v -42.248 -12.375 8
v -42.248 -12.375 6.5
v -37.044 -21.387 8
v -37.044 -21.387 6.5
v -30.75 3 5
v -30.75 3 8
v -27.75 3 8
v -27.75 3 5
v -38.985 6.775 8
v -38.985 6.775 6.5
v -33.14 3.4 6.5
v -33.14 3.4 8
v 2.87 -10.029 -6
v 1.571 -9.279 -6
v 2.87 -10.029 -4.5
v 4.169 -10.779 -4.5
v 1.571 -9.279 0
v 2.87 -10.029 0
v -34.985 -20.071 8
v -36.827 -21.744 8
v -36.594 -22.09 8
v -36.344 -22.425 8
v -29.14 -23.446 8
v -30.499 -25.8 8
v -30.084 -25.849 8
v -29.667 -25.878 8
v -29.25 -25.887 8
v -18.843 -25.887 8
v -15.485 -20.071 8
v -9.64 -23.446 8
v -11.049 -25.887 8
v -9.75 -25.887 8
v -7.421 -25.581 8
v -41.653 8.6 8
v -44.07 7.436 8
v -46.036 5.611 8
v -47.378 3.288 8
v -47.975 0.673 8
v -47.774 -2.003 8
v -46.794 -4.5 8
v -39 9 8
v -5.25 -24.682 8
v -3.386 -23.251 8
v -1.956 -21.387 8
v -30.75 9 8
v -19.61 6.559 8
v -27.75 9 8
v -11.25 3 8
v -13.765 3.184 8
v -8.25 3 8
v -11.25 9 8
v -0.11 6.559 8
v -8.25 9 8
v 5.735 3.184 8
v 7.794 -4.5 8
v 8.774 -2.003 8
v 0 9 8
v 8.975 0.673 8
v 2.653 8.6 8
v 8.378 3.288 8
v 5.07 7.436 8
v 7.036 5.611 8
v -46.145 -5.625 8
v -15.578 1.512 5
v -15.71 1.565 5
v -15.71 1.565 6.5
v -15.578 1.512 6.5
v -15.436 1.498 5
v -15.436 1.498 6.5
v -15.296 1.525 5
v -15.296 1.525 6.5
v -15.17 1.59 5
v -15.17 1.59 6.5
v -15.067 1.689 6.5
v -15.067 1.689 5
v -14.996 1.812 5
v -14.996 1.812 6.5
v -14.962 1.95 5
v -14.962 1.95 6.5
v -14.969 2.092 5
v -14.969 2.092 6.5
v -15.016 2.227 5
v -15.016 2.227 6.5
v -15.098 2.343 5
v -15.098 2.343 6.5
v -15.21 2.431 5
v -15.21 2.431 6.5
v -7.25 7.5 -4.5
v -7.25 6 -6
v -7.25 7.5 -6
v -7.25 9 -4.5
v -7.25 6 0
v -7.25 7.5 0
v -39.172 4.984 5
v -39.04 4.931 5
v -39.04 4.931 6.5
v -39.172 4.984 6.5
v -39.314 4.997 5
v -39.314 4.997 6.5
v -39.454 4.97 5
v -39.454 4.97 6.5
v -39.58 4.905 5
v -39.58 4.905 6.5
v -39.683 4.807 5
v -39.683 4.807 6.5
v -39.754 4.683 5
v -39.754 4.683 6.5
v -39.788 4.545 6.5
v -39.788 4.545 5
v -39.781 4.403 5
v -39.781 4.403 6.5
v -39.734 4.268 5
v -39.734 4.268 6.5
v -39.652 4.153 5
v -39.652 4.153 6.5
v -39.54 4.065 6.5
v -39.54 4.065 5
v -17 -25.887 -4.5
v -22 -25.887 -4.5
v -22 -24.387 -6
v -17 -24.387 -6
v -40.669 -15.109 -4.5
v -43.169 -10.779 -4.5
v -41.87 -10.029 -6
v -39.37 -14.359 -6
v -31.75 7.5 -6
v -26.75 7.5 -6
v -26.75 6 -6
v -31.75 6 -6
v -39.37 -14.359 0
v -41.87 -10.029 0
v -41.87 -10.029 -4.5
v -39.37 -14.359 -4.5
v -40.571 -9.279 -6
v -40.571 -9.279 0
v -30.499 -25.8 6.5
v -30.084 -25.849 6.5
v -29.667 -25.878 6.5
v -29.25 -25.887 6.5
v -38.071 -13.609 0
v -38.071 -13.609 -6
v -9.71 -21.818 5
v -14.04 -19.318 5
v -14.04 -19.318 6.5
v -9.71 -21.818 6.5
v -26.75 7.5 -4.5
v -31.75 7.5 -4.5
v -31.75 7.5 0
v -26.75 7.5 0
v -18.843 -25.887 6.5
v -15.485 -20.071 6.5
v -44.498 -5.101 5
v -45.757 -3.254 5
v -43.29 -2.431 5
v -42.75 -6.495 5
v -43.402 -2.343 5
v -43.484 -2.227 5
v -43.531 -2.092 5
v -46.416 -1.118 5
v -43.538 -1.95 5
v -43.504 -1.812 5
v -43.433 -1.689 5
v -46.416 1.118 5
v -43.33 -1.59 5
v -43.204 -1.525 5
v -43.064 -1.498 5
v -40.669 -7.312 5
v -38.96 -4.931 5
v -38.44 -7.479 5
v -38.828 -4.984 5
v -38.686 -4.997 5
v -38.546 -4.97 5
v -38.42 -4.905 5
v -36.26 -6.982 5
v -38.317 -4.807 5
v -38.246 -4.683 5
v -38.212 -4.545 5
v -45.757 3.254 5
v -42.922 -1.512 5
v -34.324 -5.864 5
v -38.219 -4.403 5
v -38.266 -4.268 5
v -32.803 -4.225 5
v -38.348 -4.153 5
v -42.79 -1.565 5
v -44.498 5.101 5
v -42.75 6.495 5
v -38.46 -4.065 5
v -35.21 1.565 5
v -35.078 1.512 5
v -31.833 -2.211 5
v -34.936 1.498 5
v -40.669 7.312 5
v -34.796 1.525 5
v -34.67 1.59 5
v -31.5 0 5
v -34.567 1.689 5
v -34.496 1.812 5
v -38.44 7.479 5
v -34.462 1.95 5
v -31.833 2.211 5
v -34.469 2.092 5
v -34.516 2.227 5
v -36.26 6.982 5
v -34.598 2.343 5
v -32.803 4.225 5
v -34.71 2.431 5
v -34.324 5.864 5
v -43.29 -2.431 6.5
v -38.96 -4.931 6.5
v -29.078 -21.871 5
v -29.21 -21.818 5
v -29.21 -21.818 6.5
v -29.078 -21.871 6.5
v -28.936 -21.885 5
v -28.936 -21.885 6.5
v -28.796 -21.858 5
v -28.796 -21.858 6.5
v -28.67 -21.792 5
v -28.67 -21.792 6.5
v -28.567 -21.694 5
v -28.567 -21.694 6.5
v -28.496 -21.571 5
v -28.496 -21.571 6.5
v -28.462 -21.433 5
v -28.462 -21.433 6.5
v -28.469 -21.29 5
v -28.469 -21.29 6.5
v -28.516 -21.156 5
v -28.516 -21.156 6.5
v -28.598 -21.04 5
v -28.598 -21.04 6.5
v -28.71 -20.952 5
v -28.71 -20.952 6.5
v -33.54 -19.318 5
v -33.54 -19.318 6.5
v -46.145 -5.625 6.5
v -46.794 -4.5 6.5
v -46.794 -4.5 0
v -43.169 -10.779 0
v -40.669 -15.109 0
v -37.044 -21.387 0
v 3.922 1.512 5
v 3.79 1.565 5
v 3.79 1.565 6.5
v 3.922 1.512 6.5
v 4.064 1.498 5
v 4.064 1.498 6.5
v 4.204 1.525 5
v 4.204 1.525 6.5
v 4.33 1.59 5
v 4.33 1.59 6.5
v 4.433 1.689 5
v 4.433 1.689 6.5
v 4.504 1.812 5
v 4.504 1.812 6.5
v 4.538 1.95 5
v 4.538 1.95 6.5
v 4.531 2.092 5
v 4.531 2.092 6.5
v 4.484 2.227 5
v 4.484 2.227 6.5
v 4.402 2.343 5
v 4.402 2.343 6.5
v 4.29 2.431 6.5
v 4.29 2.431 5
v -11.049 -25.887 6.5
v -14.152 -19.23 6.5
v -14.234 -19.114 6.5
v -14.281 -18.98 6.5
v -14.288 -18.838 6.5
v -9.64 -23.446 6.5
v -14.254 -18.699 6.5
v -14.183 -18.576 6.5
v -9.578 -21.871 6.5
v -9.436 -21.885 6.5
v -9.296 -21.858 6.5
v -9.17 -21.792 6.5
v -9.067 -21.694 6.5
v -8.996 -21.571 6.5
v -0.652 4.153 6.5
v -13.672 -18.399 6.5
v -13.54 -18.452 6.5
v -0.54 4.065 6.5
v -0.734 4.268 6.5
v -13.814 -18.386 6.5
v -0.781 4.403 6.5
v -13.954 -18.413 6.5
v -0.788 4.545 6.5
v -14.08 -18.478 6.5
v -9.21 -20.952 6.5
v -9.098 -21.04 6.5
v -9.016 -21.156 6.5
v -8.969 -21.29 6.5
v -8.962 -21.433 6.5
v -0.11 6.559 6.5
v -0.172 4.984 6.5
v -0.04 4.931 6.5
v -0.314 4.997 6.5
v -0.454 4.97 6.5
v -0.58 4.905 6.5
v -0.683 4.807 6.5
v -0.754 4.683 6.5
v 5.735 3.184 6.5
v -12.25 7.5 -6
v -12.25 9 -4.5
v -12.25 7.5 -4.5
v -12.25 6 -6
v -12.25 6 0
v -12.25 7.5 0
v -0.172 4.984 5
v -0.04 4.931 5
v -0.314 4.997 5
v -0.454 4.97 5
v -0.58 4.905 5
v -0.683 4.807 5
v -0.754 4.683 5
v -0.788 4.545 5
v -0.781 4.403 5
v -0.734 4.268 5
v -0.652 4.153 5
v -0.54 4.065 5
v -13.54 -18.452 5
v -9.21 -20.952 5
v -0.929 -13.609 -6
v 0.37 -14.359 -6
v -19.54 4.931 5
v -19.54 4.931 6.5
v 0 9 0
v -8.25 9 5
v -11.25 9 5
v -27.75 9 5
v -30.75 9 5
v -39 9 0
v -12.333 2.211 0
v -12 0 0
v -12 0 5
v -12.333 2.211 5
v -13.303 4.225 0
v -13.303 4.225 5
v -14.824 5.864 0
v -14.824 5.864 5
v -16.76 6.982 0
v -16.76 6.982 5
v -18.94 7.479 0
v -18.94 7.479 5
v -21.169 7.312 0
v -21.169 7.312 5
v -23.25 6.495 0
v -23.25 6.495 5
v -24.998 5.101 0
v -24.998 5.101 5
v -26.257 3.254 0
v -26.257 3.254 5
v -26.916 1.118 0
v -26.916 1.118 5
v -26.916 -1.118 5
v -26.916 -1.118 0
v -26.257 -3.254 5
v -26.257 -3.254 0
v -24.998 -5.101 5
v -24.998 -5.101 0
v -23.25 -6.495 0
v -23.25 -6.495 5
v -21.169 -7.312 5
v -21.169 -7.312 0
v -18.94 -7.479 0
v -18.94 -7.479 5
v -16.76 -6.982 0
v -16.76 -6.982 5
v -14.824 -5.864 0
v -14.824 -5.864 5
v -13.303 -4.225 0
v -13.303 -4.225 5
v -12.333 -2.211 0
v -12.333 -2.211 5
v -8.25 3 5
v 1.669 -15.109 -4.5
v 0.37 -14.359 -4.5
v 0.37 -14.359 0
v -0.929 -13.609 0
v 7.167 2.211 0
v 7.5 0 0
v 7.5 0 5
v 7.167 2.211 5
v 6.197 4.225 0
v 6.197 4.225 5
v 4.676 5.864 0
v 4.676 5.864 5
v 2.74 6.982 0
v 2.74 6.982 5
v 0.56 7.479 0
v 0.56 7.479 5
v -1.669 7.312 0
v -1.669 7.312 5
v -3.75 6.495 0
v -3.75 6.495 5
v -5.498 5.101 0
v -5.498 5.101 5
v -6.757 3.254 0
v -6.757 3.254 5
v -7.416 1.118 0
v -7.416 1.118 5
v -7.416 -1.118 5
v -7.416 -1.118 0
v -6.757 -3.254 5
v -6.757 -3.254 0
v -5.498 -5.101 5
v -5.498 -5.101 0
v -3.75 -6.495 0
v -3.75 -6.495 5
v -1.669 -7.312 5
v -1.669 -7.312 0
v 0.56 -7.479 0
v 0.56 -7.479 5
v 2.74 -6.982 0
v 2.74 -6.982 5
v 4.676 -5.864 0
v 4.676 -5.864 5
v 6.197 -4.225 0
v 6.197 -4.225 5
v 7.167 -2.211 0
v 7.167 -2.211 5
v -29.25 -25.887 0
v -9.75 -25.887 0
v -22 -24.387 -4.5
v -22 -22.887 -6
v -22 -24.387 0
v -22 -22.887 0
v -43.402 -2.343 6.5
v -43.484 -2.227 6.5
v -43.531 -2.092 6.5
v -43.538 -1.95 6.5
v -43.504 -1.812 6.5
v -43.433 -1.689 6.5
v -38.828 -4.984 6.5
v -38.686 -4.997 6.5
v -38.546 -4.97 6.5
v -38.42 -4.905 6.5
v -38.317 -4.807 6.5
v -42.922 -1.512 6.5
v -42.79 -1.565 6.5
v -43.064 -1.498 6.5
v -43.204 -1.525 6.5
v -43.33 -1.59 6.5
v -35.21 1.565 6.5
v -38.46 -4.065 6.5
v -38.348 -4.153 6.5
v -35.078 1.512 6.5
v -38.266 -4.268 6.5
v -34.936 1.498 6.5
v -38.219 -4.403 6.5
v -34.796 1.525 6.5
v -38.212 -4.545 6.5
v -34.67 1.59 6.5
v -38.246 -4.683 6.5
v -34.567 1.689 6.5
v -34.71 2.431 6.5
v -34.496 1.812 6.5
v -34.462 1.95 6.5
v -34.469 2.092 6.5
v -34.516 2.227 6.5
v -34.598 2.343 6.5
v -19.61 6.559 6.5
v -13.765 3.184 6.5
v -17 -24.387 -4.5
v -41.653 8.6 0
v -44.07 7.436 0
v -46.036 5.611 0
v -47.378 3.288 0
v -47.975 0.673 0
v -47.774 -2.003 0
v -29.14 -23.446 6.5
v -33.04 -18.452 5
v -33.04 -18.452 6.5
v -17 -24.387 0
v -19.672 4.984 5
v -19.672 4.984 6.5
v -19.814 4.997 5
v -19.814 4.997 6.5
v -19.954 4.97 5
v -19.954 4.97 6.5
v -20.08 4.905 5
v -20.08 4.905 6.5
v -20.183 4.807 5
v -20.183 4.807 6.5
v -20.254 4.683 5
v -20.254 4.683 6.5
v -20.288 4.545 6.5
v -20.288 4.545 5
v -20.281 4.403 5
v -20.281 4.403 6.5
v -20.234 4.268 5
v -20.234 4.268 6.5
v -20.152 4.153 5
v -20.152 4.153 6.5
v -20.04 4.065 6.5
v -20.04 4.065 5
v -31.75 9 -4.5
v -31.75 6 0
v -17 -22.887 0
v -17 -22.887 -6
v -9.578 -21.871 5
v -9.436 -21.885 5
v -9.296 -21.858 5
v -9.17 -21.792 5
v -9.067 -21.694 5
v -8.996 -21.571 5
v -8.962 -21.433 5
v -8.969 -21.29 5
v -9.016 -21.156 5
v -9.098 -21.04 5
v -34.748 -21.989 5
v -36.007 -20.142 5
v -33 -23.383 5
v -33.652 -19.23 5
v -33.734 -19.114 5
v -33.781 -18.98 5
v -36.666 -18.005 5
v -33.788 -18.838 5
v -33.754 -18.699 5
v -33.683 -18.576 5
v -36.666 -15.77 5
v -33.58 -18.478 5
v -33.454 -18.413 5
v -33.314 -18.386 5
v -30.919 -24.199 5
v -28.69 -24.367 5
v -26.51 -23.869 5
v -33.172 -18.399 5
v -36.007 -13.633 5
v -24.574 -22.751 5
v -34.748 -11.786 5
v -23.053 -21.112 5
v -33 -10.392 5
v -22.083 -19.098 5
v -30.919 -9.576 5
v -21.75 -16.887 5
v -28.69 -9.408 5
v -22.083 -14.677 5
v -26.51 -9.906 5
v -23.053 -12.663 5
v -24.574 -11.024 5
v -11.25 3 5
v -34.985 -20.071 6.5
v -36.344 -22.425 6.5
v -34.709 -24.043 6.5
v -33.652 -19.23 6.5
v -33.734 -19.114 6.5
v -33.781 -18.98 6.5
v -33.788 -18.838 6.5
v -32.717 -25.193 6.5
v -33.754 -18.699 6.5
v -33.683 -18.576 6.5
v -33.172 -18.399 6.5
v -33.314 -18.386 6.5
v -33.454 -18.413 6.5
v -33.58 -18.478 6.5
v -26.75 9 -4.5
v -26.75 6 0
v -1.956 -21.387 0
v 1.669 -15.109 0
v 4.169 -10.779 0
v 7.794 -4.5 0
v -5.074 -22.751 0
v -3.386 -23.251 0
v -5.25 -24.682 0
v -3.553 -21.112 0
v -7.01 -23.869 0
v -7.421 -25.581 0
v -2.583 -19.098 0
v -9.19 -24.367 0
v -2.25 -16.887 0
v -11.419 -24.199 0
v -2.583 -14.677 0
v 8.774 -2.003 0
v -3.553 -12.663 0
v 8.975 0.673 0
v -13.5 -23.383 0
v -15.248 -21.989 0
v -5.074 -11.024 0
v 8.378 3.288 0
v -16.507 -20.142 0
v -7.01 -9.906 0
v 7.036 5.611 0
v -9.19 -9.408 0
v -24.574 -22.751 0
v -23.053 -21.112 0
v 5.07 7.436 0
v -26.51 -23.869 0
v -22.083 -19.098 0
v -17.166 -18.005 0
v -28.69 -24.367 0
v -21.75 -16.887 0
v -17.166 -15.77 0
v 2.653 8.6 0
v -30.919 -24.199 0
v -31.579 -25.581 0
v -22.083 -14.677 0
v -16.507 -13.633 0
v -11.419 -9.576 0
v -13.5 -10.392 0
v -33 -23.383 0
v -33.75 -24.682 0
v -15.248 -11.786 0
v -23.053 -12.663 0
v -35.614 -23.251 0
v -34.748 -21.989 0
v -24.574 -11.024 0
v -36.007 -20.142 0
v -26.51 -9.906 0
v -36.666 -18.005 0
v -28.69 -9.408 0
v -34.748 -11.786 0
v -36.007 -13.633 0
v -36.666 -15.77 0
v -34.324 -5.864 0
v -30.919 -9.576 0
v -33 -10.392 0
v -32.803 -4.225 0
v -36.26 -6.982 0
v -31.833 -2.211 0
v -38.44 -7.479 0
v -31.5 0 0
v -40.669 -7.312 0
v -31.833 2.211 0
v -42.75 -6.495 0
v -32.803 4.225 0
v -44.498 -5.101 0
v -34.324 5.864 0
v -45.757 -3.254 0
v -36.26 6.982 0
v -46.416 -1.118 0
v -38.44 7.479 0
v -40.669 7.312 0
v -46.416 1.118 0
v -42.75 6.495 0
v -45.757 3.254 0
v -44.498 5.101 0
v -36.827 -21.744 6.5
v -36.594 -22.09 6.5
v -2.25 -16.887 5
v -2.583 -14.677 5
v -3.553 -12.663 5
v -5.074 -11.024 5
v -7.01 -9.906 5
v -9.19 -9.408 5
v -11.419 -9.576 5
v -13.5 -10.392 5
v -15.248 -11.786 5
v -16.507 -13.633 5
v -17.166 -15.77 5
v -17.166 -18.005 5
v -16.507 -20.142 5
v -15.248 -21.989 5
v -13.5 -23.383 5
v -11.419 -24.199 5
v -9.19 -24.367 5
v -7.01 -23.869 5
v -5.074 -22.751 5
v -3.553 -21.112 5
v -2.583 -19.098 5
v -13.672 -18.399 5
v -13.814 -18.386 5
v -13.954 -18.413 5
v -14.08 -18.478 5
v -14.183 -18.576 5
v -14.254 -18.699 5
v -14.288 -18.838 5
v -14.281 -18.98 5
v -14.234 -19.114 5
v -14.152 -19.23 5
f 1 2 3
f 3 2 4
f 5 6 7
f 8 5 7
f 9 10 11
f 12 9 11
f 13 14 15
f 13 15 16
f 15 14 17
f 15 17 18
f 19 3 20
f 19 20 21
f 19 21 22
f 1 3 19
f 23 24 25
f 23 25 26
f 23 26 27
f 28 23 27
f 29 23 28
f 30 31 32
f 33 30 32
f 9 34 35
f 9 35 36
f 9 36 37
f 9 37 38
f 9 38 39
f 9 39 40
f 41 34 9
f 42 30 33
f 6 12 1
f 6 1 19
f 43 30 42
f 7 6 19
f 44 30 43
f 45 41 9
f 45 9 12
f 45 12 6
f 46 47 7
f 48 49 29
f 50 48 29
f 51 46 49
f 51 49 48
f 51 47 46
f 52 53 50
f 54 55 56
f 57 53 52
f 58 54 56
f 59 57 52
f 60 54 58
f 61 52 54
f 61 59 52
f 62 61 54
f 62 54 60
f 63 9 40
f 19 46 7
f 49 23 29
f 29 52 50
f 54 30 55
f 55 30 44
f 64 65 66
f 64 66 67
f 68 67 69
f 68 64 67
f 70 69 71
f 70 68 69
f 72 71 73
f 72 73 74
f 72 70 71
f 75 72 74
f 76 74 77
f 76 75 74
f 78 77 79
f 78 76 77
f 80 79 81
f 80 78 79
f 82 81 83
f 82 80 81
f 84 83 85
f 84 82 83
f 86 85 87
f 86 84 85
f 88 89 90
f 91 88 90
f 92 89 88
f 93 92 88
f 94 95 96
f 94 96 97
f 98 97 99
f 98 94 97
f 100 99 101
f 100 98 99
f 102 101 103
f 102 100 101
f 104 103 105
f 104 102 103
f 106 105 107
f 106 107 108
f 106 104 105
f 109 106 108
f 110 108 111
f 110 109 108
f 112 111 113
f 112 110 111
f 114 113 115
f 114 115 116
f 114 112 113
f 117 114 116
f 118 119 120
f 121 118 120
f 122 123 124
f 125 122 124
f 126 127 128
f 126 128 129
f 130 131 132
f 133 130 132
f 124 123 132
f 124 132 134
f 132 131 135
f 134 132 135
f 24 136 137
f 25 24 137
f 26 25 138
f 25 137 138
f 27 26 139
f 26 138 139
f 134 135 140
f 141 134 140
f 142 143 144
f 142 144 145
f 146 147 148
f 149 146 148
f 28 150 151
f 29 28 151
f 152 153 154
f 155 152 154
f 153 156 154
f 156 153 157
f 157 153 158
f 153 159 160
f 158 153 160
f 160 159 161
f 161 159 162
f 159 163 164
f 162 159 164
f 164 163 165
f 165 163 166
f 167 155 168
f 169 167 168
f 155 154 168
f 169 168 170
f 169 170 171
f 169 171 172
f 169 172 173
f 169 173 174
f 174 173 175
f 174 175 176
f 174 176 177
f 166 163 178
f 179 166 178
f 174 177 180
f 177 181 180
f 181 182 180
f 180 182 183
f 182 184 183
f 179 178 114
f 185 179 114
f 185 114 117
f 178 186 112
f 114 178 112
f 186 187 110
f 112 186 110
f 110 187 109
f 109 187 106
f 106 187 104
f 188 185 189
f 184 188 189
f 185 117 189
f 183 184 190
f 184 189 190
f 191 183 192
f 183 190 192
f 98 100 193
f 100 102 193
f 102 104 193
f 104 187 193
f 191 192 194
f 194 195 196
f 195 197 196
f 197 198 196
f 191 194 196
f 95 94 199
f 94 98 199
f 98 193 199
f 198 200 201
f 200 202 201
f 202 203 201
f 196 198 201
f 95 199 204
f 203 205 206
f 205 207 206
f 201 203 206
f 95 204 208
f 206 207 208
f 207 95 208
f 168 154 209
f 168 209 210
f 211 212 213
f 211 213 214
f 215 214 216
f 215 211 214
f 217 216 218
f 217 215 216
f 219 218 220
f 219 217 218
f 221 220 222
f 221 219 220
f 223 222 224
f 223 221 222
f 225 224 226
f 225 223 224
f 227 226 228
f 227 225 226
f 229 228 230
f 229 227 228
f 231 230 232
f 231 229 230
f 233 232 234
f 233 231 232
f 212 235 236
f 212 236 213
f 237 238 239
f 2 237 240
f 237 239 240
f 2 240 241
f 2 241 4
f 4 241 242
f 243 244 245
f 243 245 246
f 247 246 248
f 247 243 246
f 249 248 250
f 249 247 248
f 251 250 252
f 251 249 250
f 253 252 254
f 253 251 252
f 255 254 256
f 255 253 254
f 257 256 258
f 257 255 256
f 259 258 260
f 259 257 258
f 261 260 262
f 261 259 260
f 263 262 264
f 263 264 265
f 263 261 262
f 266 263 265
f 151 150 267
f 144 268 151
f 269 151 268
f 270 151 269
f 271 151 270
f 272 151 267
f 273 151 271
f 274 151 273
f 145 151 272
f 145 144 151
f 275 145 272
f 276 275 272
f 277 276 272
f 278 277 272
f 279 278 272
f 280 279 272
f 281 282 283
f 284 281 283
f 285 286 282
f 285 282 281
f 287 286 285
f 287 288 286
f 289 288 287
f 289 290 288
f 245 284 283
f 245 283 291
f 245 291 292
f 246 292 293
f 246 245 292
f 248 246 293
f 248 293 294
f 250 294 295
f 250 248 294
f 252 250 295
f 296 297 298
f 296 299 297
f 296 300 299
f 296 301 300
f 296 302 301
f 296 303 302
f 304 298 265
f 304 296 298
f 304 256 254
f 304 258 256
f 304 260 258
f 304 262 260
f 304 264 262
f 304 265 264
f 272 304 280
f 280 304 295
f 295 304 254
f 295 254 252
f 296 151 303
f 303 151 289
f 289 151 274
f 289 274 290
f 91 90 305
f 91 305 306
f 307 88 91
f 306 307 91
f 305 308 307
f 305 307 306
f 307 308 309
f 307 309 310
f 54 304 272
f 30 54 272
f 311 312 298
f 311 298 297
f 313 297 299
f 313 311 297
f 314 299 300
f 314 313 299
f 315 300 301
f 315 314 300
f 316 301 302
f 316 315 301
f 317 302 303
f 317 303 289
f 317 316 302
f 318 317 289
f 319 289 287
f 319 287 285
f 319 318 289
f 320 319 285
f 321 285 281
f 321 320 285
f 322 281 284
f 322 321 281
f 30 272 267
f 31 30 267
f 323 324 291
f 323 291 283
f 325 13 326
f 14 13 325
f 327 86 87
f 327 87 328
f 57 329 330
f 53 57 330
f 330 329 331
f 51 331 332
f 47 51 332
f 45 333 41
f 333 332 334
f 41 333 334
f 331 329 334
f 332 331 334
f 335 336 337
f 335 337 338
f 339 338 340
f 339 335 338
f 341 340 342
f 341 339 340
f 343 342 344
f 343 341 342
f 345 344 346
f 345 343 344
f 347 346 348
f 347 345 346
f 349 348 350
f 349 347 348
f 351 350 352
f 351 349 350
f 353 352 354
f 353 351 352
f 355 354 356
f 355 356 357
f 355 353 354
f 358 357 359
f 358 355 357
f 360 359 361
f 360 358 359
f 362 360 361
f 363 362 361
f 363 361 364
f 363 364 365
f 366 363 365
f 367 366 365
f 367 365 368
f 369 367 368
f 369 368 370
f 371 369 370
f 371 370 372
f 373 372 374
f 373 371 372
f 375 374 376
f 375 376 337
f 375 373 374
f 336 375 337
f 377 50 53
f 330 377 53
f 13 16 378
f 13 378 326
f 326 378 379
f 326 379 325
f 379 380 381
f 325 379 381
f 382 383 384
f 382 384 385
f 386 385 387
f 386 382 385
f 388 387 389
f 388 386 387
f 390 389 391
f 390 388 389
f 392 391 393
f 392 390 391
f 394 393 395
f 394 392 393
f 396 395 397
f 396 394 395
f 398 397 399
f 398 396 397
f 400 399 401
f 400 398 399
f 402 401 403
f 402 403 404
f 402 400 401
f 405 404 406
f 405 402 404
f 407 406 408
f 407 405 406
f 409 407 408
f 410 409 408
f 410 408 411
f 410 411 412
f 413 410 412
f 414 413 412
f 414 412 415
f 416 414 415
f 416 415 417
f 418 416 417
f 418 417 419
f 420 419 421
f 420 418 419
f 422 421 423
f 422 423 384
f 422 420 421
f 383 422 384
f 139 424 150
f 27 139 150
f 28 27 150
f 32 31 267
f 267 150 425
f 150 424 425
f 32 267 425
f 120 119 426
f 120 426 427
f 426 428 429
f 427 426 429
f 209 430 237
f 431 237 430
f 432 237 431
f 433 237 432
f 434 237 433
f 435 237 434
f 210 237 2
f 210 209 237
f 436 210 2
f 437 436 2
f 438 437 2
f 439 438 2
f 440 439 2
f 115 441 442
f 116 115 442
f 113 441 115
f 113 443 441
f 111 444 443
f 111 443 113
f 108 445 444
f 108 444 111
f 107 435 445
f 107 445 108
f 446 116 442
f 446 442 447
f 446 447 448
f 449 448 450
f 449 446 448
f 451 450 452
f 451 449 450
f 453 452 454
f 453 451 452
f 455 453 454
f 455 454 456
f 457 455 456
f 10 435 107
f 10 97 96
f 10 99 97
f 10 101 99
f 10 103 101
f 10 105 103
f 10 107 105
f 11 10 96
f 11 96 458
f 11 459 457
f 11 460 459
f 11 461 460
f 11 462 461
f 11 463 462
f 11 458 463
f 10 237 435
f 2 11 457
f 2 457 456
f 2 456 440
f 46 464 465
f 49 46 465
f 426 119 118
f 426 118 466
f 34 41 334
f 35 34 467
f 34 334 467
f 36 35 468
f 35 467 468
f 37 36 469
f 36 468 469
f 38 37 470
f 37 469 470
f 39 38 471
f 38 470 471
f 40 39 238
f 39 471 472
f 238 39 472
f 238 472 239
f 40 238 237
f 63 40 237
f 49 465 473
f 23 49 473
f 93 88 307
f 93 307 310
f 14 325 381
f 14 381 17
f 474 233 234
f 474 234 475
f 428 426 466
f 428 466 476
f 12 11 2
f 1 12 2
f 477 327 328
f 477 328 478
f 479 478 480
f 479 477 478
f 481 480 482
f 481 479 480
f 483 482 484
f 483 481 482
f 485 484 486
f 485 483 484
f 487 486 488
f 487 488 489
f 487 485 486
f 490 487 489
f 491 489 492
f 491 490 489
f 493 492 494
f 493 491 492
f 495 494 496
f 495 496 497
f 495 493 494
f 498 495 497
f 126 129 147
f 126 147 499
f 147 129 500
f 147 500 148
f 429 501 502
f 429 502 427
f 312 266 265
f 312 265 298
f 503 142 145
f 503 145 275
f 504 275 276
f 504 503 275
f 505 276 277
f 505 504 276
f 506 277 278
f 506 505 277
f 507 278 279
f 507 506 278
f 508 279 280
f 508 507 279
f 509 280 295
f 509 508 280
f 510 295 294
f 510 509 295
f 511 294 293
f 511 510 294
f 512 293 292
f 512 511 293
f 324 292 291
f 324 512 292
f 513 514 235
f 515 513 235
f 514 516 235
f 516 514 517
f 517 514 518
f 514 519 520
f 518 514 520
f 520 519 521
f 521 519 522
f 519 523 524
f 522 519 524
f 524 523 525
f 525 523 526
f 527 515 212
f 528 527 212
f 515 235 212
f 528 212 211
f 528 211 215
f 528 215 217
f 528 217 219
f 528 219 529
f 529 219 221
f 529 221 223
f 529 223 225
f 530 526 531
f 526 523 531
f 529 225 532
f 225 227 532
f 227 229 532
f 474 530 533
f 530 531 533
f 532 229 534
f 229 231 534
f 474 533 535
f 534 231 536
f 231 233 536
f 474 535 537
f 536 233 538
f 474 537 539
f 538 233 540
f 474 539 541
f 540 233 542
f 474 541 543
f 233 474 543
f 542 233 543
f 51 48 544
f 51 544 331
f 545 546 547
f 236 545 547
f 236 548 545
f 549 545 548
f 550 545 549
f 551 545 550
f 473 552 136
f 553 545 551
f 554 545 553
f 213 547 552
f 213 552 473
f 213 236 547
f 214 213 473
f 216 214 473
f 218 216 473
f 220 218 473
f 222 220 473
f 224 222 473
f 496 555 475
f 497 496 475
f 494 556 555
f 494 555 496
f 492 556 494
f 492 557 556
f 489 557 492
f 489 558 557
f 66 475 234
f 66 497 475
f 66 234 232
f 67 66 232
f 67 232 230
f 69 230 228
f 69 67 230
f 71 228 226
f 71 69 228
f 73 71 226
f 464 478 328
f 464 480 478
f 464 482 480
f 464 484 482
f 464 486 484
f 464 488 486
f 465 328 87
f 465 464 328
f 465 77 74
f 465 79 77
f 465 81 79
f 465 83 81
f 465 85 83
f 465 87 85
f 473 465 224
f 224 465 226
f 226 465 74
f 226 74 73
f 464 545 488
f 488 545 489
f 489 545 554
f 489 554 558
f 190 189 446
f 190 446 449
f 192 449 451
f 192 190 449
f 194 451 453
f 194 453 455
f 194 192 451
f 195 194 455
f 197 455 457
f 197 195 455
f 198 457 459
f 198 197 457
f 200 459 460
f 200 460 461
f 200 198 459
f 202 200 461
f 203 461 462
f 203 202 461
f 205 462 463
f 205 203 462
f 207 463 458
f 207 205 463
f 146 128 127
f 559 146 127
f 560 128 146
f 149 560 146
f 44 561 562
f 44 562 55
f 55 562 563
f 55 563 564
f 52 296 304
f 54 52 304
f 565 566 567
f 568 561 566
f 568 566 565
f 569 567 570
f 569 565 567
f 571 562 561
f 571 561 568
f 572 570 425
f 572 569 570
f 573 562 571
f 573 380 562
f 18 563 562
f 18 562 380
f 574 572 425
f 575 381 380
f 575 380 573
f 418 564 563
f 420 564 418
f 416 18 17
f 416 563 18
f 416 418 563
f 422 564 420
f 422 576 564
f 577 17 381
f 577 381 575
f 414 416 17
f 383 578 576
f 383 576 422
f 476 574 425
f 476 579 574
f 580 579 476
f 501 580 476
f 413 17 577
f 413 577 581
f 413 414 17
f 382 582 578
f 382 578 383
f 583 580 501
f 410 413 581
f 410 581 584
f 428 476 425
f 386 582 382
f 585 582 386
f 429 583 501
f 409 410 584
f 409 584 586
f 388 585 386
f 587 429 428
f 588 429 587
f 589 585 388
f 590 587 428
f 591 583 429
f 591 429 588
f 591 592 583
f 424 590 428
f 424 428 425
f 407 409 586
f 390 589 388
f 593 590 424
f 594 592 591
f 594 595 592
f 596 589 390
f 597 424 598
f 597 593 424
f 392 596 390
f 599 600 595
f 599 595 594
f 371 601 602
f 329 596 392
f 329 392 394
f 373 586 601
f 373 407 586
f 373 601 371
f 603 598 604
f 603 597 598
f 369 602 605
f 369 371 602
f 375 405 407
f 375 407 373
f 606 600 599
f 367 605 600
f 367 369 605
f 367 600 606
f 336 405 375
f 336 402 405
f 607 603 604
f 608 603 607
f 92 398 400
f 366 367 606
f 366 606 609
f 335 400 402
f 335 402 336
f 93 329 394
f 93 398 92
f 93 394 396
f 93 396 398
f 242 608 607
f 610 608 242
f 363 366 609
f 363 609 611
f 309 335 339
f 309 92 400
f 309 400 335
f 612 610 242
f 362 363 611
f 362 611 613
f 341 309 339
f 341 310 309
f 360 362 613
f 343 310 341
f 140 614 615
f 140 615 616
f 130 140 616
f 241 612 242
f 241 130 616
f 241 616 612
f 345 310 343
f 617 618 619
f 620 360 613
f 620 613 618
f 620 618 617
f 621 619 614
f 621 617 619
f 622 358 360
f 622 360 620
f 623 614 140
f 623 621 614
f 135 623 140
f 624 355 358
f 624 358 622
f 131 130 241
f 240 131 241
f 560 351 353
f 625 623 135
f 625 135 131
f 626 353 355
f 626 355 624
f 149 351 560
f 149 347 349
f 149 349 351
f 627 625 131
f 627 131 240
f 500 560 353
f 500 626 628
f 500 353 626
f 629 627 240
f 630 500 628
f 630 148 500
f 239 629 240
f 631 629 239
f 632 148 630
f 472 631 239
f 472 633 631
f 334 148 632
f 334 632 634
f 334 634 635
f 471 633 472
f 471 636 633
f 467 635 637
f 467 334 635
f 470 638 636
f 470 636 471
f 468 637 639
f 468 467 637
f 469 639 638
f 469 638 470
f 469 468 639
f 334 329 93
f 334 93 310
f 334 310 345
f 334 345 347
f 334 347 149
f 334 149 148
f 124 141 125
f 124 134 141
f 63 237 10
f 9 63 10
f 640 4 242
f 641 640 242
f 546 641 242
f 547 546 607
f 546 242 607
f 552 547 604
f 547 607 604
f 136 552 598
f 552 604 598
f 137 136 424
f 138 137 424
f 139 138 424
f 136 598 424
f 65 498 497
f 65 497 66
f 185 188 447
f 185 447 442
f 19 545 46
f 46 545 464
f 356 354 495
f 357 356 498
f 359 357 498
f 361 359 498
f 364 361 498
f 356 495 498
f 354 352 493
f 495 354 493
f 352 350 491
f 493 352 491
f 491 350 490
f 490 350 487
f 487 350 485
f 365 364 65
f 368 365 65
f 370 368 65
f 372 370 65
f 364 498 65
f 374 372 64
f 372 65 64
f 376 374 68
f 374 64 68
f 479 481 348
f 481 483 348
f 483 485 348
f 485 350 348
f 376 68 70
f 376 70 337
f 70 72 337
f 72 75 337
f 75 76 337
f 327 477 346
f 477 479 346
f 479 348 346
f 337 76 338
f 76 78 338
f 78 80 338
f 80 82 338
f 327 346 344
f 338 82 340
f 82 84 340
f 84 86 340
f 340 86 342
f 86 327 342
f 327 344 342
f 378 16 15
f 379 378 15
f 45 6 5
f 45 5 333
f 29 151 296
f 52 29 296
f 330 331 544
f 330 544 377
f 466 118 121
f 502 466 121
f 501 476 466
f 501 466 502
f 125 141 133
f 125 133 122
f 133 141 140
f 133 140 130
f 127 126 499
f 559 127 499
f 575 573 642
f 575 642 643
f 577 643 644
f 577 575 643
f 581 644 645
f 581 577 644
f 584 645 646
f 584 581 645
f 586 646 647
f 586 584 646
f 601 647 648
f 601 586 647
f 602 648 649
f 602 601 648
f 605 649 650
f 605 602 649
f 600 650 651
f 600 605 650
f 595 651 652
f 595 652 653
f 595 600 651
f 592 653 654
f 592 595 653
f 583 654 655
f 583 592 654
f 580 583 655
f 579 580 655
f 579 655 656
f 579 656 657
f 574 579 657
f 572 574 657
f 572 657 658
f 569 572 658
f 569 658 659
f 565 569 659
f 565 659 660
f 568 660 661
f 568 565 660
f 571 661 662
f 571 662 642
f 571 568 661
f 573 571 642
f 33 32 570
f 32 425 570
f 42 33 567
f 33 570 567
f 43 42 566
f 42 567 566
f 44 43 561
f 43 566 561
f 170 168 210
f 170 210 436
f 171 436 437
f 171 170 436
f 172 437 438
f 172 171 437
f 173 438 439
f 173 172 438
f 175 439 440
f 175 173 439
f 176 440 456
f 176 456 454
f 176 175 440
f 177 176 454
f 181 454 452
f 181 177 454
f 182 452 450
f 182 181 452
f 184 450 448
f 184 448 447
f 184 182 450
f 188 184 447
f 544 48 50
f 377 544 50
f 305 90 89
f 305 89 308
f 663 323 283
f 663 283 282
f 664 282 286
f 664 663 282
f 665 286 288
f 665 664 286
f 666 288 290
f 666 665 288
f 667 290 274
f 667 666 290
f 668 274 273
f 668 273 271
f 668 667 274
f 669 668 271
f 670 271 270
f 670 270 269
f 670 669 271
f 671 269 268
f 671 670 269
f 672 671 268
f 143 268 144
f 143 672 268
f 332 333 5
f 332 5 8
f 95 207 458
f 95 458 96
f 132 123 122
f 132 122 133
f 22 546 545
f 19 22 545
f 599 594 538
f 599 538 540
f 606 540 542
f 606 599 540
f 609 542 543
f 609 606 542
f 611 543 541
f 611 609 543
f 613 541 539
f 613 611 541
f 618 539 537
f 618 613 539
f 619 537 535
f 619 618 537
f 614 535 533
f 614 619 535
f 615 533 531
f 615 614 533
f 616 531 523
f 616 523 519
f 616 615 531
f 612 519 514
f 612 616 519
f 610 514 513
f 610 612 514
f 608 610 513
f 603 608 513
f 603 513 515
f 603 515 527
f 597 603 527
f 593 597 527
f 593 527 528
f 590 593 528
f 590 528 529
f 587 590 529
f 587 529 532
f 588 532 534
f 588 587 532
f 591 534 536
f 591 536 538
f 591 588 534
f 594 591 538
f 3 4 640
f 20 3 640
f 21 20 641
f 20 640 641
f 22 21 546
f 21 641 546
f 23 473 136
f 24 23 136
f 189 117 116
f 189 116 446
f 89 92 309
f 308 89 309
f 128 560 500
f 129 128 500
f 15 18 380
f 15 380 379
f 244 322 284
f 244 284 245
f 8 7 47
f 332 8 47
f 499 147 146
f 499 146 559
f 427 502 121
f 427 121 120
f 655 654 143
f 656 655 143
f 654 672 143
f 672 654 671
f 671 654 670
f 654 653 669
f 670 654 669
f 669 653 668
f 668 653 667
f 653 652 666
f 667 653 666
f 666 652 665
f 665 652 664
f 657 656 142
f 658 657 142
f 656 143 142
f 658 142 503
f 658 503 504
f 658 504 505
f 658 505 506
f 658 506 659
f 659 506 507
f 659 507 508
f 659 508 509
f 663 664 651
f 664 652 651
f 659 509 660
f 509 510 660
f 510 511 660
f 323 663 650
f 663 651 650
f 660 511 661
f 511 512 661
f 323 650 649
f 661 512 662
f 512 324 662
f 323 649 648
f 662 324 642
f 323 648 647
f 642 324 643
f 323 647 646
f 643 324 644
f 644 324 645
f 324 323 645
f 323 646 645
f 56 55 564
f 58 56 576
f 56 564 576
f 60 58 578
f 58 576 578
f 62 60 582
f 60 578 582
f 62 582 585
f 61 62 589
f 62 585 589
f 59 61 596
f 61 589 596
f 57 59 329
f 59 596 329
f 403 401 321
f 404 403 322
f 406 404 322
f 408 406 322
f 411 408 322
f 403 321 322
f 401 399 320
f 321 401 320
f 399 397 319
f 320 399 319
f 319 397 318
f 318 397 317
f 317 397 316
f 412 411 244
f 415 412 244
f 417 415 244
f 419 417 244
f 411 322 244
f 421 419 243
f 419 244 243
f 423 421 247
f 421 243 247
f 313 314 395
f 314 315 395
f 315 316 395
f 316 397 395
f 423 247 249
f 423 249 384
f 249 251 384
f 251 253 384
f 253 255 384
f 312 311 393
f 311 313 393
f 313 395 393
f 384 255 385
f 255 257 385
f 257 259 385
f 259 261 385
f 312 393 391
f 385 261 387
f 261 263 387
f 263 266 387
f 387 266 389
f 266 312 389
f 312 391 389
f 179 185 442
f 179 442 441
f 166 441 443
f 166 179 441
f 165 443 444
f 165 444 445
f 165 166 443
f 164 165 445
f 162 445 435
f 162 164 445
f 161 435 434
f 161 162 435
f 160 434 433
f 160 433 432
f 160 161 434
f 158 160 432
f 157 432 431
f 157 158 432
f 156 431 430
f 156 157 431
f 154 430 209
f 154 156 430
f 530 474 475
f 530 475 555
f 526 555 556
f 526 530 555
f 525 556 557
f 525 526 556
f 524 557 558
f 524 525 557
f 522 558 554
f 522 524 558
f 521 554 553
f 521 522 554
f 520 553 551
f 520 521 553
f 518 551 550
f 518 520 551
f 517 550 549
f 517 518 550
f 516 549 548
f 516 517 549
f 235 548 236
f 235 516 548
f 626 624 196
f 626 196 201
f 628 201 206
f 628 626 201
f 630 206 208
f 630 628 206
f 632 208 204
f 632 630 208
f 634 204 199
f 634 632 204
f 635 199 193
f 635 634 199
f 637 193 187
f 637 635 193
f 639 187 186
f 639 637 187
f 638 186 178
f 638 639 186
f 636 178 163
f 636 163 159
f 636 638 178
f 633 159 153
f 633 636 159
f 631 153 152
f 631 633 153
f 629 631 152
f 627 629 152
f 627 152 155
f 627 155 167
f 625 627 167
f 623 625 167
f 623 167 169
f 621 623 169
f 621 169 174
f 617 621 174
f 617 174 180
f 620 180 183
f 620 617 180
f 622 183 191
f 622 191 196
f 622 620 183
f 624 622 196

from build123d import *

# Parameters (mm, degrees)
SKETCH1_R           = 7.5
BOSS_EXTRUDE1_DEPTH = 5
BOSS_EXTRUDE2_DEPTH = 1.5
BOSS_EXTRUDE3_DEPTH = 1.5
SKETCH4_W           = 5
SKETCH4_H           = 3
BOSS_EXTRUDE4_DEPTH = 6
CUT_EXTRUDE1_REACH  = 58.12
SKETCH5_W           = 1.5
SKETCH5_H           = 4.5
CUT_EXTRUDE2_REACH  = 50.936
SKETCH7_W           = 4.5
SKETCH7_H           = 1.5
CUT_EXTRUDE3_REACH  = 43.172
SKETCH8_W           = 4.5
SKETCH8_H           = 1.5
SKETCH9_W           = 3
SKETCH9_H           = 6
CUT_EXTRUDE4_DEPTH  = 3


with BuildPart() as part:
    # Sketch1 → Boss-Extrude1 (new body)
    with BuildSketch(Plane.XY):
        with BuildLine():
            Line((7.794228634, -4.5), (-1.955771366, -21.387495374))
            ThreePointArc((-1.955771366, -21.387495374), (-5.25, -24.681724008), (-9.75, -25.887495374))
            Line((-9.75, -25.887495374), (-29.25, -25.887495374))
            ThreePointArc((-29.25, -25.887495374), (-33.75, -24.681724008), (-37.044228634, -21.387495374))
            Line((-37.044228634, -21.387495374), (-46.794228634, -4.5))
            ThreePointArc((-46.794228634, -4.5), (-46.794228634, 4.5), (-39, 9))
            Line((-39, 9), (0, 9))
            ThreePointArc((0, 9), (7.794228634, 4.5), (7.794228634, -4.5))
        make_face()
        with Locations((-29.25, -16.887495374)):
            Circle(SKETCH1_R, mode=Mode.SUBTRACT)
        with Locations((-19.5, 0)):
            Circle(SKETCH1_R, mode=Mode.SUBTRACT)
        Circle(SKETCH1_R, mode=Mode.SUBTRACT)
        with Locations((-9.75, -16.887495374)):
            Circle(SKETCH1_R, mode=Mode.SUBTRACT)
        with Locations((-39, 0)):
            Circle(SKETCH1_R, mode=Mode.SUBTRACT)
    extrude(amount=BOSS_EXTRUDE1_DEPTH)

    # Sketch2 → Boss-Extrude2 (add)
    with BuildSketch(Plane.XY.offset(5)):
        with BuildLine():
            ThreePointArc((-9.75, -25.887495374), (-5.25, -24.681724008), (-1.955771366, -21.387495374))
            Line((-1.955771366, -21.387495374), (7.794228634, -4.5))
            ThreePointArc((7.794228634, -4.5), (7.794228634, 4.5), (0, 9))
            Line((0, 9), (-39, 9))
            ThreePointArc((-39, 9), (-46.794228634, 4.5), (-46.794228634, -4.5))
            Line((-46.794228634, -4.5), (-37.044228634, -21.387495374))
            ThreePointArc((-37.044228634, -21.387495374), (-33.75, -24.681724008), (-29.25, -25.887495374))
            Line((-29.25, -25.887495374), (-9.75, -25.887495374))
        make_face()
        with BuildLine():
            Line((-29.209936491, -21.81810334), (-33.540063509, -19.31810334))
            ThreePointArc((-33.540063509, -19.31810334), (-33.723076211, -18.635090638), (-33.040063509, -18.452077936))
            Line((-33.040063509, -18.452077936), (-28.709936491, -20.952077936))
            ThreePointArc((-28.709936491, -20.952077936), (-28.526923789, -21.635090638), (-29.209936491, -21.81810334))
        make_face(mode=Mode.SUBTRACT)
        with BuildLine():
            Line((-9.709936491, -21.81810334), (-14.040063509, -19.31810334))
            ThreePointArc((-14.040063509, -19.31810334), (-14.223076211, -18.635090638), (-13.540063509, -18.452077936))
            Line((-13.540063509, -18.452077936), (-9.209936491, -20.952077936))
            ThreePointArc((-9.209936491, -20.952077936), (-9.026923789, -21.635090638), (-9.709936491, -21.81810334))
        make_face(mode=Mode.SUBTRACT)
        with BuildLine():
            Line((-35.209936491, 1.564582562), (-39.540063509, 4.064582562))
            ThreePointArc((-39.540063509, 4.064582562), (-39.723076211, 4.747595264), (-39.040063509, 4.930607966))
            Line((-39.040063509, 4.930607966), (-34.709936491, 2.430607966))
            ThreePointArc((-34.709936491, 2.430607966), (-34.526923789, 1.747595264), (-35.209936491, 1.564582562))
        make_face(mode=Mode.SUBTRACT)
        with BuildLine():
            ThreePointArc((-38.459936491, -4.064582562), (-38.276923789, -4.747595264), (-38.959936491, -4.930607966))
            Line((-38.959936491, -4.930607966), (-43.290063509, -2.430607966))
            ThreePointArc((-43.290063509, -2.430607966), (-43.473076211, -1.747595264), (-42.790063509, -1.564582562))
            Line((-42.790063509, -1.564582562), (-38.459936491, -4.064582562))
        make_face(mode=Mode.SUBTRACT)
        with BuildLine():
            Line((-15.709936491, 1.564582562), (-20.040063509, 4.064582562))
            ThreePointArc((-20.040063509, 4.064582562), (-20.223076211, 4.747595264), (-19.540063509, 4.930607966))
            Line((-19.540063509, 4.930607966), (-15.209936491, 2.430607966))
            ThreePointArc((-15.209936491, 2.430607966), (-15.026923789, 1.747595264), (-15.709936491, 1.564582562))
        make_face(mode=Mode.SUBTRACT)
        with BuildLine():
            Line((3.790063509, 1.564582562), (-0.540063509, 4.064582562))
            ThreePointArc((-0.540063509, 4.064582562), (-0.723076211, 4.747595264), (-0.040063509, 4.930607966))
            Line((-0.040063509, 4.930607966), (4.290063509, 2.430607966))
            ThreePointArc((4.290063509, 2.430607966), (4.473076211, 1.747595264), (3.790063509, 1.564582562))
        make_face(mode=Mode.SUBTRACT)
    extrude(amount=BOSS_EXTRUDE2_DEPTH)

    # Sketch3 → Boss-Extrude3 (add)
    with BuildSketch(Plane.XY.offset(6.5)):
        with BuildLine():
            ThreePointArc((-39, 9), (-46.794228634, 4.5), (-46.794228634, -4.5))
            Line((-46.794228634, -4.5), (-46.144709581, -5.625))
            Line((-46.144709581, -5.625), (-38.985335738, 6.775399247))
            Line((-38.985335738, 6.775399247), (-33.139664262, 3.400399247))
            Line((-33.139664262, 3.400399247), (-42.247595264, -12.375))
            Line((-42.247595264, -12.375), (-37.044228634, -21.387495374))
            ThreePointArc((-37.044228634, -21.387495374), (-36.712405778, -21.918648323), (-36.344447387, -22.425438699))
            Line((-36.344447387, -22.425438699), (-34.985335738, -20.07138827))
            Line((-34.985335738, -20.07138827), (-19.610335738, 6.558892896))
            Line((-19.610335738, 6.558892896), (-13.764664262, 3.183892896))
            Line((-13.764664262, 3.183892896), (-29.139664262, -23.44638827))
            Line((-29.139664262, -23.44638827), (-30.498775911, -25.800438699))
            ThreePointArc((-30.498775911, -25.800438699), (-29.875903375, -25.865704826), (-29.25, -25.887495374))
            Line((-29.25, -25.887495374), (-18.84326674, -25.887495374))
            Line((-18.84326674, -25.887495374), (-15.485335738, -20.07138827))
            Line((-15.485335738, -20.07138827), (-0.110335738, 6.558892896))
            Line((-0.110335738, 6.558892896), (5.735335738, 3.183892896))
            Line((5.735335738, 3.183892896), (-9.639664262, -23.44638827))
            Line((-9.639664262, -23.44638827), (-11.049038106, -25.887495374))
            Line((-11.049038106, -25.887495374), (-9.75, -25.887495374))
            ThreePointArc((-9.75, -25.887495374), (-5.25, -24.681724008), (-1.955771366, -21.387495374))
            Line((-1.955771366, -21.387495374), (7.794228634, -4.5))
            ThreePointArc((7.794228634, -4.5), (7.794228634, 4.5), (0, 9))
            Line((0, 9), (-39, 9))
        make_face()
    extrude(amount=BOSS_EXTRUDE3_DEPTH)

    # Sketch4 → Boss-Extrude4 (add)
    with BuildSketch(Plane(origin=(0, 0, 0), x_dir=(-1, 0, 0), z_dir=(0, 0, -1))):
        with Locations((19.5, -24.387495374)):
            Rectangle(SKETCH4_W, SKETCH4_H)
        with Locations((29.25, 7.5)):
            Rectangle(SKETCH4_W, SKETCH4_H)
        with Locations((9.75, 7.5)):
            Rectangle(SKETCH4_W, SKETCH4_H)
        Polygon((40.669228634, -15.108811196), (43.169228634, -10.778684177), (40.571152423, -9.278684177), (38.071152423, -13.608811196), align=None)
        Polygon((-4.169228634, -10.778684177), (-1.669228634, -15.108811196), (0.928847577, -13.608811196), (-1.571152423, -9.278684177), align=None)
    extrude(amount=BOSS_EXTRUDE4_DEPTH)

    # Sketch5 → Cut-Extrude1 (cut, up to next)
    with BuildSketch(Plane(origin=(-6.125, 10.608811196, 0), x_dir=(0.8660254037844386, 0.5000000000000001, 0), z_dir=(-0.5000000000000001, 0.8660254037844386, 0)), mode=Mode.PRIVATE) as cut_extrude1_sk1:
        with Locations((-42.024990748, 2.25)):
            Rectangle(SKETCH5_W, SKETCH5_H)
    cut_extrude1_tool1 = extrude(cut_extrude1_sk1.sketch, amount=-CUT_EXTRUDE1_REACH, mode=Mode.PRIVATE) & part.part
    # Sketch5 → Cut-Extrude1 (cut, up to next)
    with BuildSketch(Plane(origin=(-6.125, 10.608811196, 0), x_dir=(0.8660254037844386, 0.5000000000000001, 0), z_dir=(-0.5000000000000001, 0.8660254037844386, 0)), mode=Mode.PRIVATE) as cut_extrude1_sk2:
        Polygon((-42.774990748, 6), (-42.774990748, 4.5), (-41.274990748, 6), align=None)
    cut_extrude1_tool2 = extrude(cut_extrude1_sk2.sketch, amount=-CUT_EXTRUDE1_REACH, mode=Mode.PRIVATE) & part.part
    cut_extrude1_1 = cut_extrude1_tool1.solids().sort_by_distance((-42.51971, -10.403684, -2.25))[0]
    add(cut_extrude1_1, mode=Mode.SUBTRACT)
    cut_extrude1_2 = cut_extrude1_tool2.solids().sort_by_distance((-42.736216, -10.528684, -5.5))[0]
    add(cut_extrude1_2, mode=Mode.SUBTRACT)
    cut_extrude1 = cut_extrude1_1 + cut_extrude1_2  # Cut-Extrude1 as one shape, for the pattern or mirror that repeats it

    # Sketch7 → Cut-Extrude2 (cut, up to next)
    with BuildSketch(Plane.ZY.offset(31.75), mode=Mode.PRIVATE) as cut_extrude2_sk1:
        with Locations((-2.25, 8.25)):
            Rectangle(SKETCH7_W, SKETCH7_H)
    cut_extrude2_tool1 = extrude(cut_extrude2_sk1.sketch, amount=-CUT_EXTRUDE2_REACH, mode=Mode.PRIVATE) & part.part
    # Sketch7 → Cut-Extrude2 (cut, up to next)
    with BuildSketch(Plane.ZY.offset(31.75), mode=Mode.PRIVATE) as cut_extrude2_sk2:
        Polygon((-6, 7.5), (-4.5, 9), (-6, 9), align=None)
    cut_extrude2_tool2 = extrude(cut_extrude2_sk2.sketch, amount=-CUT_EXTRUDE2_REACH, mode=Mode.PRIVATE) & part.part
    cut_extrude2_1 = cut_extrude2_tool1.solids().sort_by_distance((-31.75, 8.25, -2.25))[0]
    add(cut_extrude2_1, mode=Mode.SUBTRACT)
    cut_extrude2_2 = cut_extrude2_tool2.solids().sort_by_distance((-31.75, 8.5, -5.5))[0]
    add(cut_extrude2_2, mode=Mode.SUBTRACT)
    cut_extrude2 = cut_extrude2_1 + cut_extrude2_2  # Cut-Extrude2 as one shape, for the pattern or mirror that repeats it

    # Mirror1: Cut-Extrude1, Cut-Extrude2 across plane
    add(cut_extrude1.mirror(Plane(origin=(-19.5, 0, 0), x_dir=(0, 0, 1), z_dir=(1, 0, 0))), mode=Mode.SUBTRACT)
    add(cut_extrude2.mirror(Plane(origin=(-19.5, 0, 0), x_dir=(0, 0, 1), z_dir=(1, 0, 0))), mode=Mode.SUBTRACT)

    # Sketch8 → Cut-Extrude3 (cut, up to next)
    with BuildSketch(Plane.ZY.offset(22), mode=Mode.PRIVATE) as cut_extrude3_sk1:
        Polygon((-6, -25.887495374), (-4.5, -25.887495374), (-6, -24.387495374), align=None)
    cut_extrude3_tool1 = extrude(cut_extrude3_sk1.sketch, amount=-CUT_EXTRUDE3_REACH, mode=Mode.PRIVATE) & part.part
    # Sketch8 → Cut-Extrude3 (cut, up to next)
    with BuildSketch(Plane.ZY.offset(22), mode=Mode.PRIVATE) as cut_extrude3_sk2:
        with Locations((-2.25, -25.137495374)):
            Rectangle(SKETCH8_W, SKETCH8_H)
    cut_extrude3_tool2 = extrude(cut_extrude3_sk2.sketch, amount=-CUT_EXTRUDE3_REACH, mode=Mode.PRIVATE) & part.part
    add(cut_extrude3_tool1.solids().sort_by_distance((-22, -25.387495, -5.5))[0], mode=Mode.SUBTRACT)
    add(cut_extrude3_tool2.solids().sort_by_distance((-22, -25.137495, -2.25))[0], mode=Mode.SUBTRACT)

    # Sketch9 → Cut-Extrude4 (cut)
    with BuildSketch(Plane.XY.offset(8)):
        with Locations((-29.25, 6)):
            Rectangle(SKETCH9_W, SKETCH9_H)
        with Locations((-9.75, 6)):
            Rectangle(SKETCH9_W, SKETCH9_H)
    extrude(amount=-CUT_EXTRUDE4_DEPTH, mode=Mode.SUBTRACT)


solid = part.part
